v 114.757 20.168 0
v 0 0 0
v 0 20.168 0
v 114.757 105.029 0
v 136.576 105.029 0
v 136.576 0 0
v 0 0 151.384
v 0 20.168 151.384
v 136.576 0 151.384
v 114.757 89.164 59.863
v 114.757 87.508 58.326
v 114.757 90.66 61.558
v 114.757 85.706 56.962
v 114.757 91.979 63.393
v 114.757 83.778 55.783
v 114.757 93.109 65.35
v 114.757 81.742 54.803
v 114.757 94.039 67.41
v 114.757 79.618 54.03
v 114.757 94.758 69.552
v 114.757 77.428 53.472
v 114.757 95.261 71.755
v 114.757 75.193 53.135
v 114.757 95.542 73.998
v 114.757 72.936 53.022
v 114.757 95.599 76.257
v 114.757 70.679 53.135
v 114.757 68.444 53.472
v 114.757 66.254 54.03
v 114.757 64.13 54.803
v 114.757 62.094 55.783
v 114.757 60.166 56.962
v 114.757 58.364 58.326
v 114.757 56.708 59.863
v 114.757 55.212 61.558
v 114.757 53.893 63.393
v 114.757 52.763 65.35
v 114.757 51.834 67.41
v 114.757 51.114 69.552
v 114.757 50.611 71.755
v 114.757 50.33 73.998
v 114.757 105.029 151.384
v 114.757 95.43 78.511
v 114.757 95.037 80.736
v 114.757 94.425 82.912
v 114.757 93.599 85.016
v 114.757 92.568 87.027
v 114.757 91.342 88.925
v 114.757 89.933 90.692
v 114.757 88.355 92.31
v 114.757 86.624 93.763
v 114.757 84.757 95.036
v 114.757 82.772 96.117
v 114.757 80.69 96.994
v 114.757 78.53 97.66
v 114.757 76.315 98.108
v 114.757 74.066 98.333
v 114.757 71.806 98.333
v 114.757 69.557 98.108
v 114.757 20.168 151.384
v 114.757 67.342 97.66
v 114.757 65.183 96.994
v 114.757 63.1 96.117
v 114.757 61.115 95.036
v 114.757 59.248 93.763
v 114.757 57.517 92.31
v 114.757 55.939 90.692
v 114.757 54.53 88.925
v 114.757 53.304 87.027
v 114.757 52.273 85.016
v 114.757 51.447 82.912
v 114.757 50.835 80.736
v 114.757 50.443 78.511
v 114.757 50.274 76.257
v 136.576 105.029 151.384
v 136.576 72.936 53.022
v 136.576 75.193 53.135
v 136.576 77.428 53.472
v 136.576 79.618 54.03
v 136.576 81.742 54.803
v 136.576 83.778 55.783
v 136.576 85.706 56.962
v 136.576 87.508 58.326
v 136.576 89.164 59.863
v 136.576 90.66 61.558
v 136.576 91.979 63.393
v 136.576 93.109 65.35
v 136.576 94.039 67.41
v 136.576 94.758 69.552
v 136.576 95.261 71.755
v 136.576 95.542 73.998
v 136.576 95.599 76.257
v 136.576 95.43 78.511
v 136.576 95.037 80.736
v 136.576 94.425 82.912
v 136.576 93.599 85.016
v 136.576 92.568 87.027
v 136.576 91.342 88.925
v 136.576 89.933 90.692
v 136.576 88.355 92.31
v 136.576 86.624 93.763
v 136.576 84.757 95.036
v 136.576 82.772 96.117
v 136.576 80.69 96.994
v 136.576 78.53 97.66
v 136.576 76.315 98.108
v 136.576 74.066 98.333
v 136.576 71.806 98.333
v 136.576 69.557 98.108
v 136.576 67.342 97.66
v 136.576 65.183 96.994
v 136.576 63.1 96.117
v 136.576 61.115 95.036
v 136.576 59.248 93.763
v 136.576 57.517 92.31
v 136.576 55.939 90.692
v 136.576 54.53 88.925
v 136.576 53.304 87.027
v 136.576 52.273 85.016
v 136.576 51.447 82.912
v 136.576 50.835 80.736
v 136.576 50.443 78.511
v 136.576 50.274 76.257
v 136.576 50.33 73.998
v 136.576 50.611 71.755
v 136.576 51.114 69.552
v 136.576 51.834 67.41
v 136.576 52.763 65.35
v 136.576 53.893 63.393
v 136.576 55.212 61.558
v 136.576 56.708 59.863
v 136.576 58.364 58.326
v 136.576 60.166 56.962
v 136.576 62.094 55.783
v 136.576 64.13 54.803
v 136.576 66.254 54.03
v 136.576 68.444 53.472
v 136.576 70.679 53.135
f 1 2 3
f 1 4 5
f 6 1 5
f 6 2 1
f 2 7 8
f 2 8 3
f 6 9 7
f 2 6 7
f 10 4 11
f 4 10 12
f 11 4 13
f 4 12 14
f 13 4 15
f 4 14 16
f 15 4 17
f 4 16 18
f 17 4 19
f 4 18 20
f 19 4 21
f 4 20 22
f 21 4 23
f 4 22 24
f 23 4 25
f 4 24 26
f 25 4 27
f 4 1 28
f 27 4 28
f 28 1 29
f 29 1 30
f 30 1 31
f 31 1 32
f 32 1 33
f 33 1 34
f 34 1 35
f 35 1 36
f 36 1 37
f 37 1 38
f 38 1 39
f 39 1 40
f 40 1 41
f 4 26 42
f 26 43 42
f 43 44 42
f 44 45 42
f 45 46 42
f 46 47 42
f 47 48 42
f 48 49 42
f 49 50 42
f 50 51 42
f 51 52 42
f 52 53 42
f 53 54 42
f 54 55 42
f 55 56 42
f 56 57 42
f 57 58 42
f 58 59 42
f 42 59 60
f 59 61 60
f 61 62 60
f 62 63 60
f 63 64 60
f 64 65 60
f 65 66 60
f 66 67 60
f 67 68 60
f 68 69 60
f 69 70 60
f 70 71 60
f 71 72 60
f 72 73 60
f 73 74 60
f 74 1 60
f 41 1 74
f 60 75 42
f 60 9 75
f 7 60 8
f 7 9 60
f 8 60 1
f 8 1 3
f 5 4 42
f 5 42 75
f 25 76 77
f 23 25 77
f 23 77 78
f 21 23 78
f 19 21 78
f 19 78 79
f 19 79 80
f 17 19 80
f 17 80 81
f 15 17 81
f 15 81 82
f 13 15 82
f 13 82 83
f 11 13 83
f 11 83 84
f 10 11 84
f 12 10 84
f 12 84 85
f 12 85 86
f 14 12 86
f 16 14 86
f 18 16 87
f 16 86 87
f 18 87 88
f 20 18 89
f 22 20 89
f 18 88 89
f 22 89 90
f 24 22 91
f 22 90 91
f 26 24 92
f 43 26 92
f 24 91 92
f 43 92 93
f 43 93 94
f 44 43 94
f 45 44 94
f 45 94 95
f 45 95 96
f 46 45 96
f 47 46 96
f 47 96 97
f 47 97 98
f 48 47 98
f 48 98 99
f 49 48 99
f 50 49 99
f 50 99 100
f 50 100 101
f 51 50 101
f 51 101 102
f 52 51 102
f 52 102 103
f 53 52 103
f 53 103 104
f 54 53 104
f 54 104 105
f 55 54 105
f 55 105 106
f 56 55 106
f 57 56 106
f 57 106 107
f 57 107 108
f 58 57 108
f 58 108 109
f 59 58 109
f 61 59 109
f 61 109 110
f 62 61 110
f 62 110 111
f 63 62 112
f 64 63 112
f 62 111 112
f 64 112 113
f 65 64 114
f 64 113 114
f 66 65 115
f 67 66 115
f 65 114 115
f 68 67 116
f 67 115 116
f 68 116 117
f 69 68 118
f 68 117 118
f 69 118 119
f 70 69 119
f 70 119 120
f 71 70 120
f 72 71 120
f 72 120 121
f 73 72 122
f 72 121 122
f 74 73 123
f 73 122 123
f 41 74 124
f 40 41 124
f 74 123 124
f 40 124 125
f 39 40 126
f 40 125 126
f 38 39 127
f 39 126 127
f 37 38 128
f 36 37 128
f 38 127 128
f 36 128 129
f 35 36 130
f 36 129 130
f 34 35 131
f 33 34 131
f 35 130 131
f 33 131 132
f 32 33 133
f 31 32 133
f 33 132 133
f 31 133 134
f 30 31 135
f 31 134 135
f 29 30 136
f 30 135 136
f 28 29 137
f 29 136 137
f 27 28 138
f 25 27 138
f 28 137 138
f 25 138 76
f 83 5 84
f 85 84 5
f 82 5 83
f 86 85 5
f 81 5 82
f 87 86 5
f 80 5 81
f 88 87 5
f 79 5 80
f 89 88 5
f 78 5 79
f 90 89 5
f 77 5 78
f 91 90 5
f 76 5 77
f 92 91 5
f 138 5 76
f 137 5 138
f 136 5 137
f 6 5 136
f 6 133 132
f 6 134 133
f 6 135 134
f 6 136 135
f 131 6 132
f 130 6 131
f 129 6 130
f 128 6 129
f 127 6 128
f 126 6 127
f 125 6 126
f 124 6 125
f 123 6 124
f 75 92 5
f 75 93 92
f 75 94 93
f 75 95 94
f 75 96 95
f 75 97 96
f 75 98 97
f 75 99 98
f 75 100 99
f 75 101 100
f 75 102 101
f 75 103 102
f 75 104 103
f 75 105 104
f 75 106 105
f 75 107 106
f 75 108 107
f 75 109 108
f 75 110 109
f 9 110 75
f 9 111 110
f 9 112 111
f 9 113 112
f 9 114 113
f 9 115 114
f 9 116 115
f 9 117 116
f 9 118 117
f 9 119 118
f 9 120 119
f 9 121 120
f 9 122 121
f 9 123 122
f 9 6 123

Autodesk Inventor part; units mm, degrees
ref_plane "YZ Plane" through (0, 0, 0) normal (1, 0, 0) x (0, 1, 0)
ref_plane "XZ Plane" through (0, 0, 0) normal (0, 1, 0) x (-1, 0, 0)
ref_plane "XY Plane" through (0, 0, 0) normal (0, 0, 1) x (1, 0, 0)
sketch "Sketch1" plane through (0, 0, 0) normal (0, 1, 0) x (-1, 0, 0)
  line L0 (0, 0) -> (-136.5758, 0)
  line L1 (-136.5758, 0) -> (-136.5758, 151.384)
  line L2 (-136.5758, 151.384) -> (0, 151.384)
  line L3 (0, 151.384) -> (0, 0)
  dimension "d0" = 136.5758
  dimension "d1" = 151.384
extrude "Extrusion1" add sketch "Sketch1" along normal blind 20.1676
sketch "Sketch2" plane through (136.5758, 0, 151.384) normal (1, 0, 0) x (0, 0, -1)
  line L0 (151.384, 0) -> (0, 0) projected
  line L1 (151.384, 0) -> (151.384, 20.1676) projected
  line L2 (0, 20.1676) -> (151.384, 20.1676) projected
  line L3 (0, 0) -> (0, 20.1676) projected
sketch "Sketch3" plane through (0, 20.1676, 0) normal (0, 1, 0) x (1, 0, 0)
  line L0 (0, -151.384) -> (136.5758, -151.384) projected
  line L1 (136.5758, 0) -> (114.7572, 0)
  line L2 (114.7572, 0) -> (114.7572, -151.384)
  line L3 (114.7572, -151.384) -> (136.5758, -151.384)
  line L4 (136.5758, -151.384) -> (136.5758, 0)
  dimension "d4" = 21.8186
extrude "Extrusion2" add sketch "Sketch3" along normal blind 84.8614
sketch "Sketch4" plane through (136.5758, 0, 151.384) normal (1, 0, 0) x (0, 0, -1)
  line L0 (0, 105.029) -> (151.384, 105.029) projected
  circle A0 centre (75.692, 72.9361) radius 22.6695
  dimension "d7" = 45.339
  dimension "d8" = 32.0929
extrude "Extrusion3" cut sketch "Sketch4" against normal blind 84.8614
properties part number "Pulling Bracket"
